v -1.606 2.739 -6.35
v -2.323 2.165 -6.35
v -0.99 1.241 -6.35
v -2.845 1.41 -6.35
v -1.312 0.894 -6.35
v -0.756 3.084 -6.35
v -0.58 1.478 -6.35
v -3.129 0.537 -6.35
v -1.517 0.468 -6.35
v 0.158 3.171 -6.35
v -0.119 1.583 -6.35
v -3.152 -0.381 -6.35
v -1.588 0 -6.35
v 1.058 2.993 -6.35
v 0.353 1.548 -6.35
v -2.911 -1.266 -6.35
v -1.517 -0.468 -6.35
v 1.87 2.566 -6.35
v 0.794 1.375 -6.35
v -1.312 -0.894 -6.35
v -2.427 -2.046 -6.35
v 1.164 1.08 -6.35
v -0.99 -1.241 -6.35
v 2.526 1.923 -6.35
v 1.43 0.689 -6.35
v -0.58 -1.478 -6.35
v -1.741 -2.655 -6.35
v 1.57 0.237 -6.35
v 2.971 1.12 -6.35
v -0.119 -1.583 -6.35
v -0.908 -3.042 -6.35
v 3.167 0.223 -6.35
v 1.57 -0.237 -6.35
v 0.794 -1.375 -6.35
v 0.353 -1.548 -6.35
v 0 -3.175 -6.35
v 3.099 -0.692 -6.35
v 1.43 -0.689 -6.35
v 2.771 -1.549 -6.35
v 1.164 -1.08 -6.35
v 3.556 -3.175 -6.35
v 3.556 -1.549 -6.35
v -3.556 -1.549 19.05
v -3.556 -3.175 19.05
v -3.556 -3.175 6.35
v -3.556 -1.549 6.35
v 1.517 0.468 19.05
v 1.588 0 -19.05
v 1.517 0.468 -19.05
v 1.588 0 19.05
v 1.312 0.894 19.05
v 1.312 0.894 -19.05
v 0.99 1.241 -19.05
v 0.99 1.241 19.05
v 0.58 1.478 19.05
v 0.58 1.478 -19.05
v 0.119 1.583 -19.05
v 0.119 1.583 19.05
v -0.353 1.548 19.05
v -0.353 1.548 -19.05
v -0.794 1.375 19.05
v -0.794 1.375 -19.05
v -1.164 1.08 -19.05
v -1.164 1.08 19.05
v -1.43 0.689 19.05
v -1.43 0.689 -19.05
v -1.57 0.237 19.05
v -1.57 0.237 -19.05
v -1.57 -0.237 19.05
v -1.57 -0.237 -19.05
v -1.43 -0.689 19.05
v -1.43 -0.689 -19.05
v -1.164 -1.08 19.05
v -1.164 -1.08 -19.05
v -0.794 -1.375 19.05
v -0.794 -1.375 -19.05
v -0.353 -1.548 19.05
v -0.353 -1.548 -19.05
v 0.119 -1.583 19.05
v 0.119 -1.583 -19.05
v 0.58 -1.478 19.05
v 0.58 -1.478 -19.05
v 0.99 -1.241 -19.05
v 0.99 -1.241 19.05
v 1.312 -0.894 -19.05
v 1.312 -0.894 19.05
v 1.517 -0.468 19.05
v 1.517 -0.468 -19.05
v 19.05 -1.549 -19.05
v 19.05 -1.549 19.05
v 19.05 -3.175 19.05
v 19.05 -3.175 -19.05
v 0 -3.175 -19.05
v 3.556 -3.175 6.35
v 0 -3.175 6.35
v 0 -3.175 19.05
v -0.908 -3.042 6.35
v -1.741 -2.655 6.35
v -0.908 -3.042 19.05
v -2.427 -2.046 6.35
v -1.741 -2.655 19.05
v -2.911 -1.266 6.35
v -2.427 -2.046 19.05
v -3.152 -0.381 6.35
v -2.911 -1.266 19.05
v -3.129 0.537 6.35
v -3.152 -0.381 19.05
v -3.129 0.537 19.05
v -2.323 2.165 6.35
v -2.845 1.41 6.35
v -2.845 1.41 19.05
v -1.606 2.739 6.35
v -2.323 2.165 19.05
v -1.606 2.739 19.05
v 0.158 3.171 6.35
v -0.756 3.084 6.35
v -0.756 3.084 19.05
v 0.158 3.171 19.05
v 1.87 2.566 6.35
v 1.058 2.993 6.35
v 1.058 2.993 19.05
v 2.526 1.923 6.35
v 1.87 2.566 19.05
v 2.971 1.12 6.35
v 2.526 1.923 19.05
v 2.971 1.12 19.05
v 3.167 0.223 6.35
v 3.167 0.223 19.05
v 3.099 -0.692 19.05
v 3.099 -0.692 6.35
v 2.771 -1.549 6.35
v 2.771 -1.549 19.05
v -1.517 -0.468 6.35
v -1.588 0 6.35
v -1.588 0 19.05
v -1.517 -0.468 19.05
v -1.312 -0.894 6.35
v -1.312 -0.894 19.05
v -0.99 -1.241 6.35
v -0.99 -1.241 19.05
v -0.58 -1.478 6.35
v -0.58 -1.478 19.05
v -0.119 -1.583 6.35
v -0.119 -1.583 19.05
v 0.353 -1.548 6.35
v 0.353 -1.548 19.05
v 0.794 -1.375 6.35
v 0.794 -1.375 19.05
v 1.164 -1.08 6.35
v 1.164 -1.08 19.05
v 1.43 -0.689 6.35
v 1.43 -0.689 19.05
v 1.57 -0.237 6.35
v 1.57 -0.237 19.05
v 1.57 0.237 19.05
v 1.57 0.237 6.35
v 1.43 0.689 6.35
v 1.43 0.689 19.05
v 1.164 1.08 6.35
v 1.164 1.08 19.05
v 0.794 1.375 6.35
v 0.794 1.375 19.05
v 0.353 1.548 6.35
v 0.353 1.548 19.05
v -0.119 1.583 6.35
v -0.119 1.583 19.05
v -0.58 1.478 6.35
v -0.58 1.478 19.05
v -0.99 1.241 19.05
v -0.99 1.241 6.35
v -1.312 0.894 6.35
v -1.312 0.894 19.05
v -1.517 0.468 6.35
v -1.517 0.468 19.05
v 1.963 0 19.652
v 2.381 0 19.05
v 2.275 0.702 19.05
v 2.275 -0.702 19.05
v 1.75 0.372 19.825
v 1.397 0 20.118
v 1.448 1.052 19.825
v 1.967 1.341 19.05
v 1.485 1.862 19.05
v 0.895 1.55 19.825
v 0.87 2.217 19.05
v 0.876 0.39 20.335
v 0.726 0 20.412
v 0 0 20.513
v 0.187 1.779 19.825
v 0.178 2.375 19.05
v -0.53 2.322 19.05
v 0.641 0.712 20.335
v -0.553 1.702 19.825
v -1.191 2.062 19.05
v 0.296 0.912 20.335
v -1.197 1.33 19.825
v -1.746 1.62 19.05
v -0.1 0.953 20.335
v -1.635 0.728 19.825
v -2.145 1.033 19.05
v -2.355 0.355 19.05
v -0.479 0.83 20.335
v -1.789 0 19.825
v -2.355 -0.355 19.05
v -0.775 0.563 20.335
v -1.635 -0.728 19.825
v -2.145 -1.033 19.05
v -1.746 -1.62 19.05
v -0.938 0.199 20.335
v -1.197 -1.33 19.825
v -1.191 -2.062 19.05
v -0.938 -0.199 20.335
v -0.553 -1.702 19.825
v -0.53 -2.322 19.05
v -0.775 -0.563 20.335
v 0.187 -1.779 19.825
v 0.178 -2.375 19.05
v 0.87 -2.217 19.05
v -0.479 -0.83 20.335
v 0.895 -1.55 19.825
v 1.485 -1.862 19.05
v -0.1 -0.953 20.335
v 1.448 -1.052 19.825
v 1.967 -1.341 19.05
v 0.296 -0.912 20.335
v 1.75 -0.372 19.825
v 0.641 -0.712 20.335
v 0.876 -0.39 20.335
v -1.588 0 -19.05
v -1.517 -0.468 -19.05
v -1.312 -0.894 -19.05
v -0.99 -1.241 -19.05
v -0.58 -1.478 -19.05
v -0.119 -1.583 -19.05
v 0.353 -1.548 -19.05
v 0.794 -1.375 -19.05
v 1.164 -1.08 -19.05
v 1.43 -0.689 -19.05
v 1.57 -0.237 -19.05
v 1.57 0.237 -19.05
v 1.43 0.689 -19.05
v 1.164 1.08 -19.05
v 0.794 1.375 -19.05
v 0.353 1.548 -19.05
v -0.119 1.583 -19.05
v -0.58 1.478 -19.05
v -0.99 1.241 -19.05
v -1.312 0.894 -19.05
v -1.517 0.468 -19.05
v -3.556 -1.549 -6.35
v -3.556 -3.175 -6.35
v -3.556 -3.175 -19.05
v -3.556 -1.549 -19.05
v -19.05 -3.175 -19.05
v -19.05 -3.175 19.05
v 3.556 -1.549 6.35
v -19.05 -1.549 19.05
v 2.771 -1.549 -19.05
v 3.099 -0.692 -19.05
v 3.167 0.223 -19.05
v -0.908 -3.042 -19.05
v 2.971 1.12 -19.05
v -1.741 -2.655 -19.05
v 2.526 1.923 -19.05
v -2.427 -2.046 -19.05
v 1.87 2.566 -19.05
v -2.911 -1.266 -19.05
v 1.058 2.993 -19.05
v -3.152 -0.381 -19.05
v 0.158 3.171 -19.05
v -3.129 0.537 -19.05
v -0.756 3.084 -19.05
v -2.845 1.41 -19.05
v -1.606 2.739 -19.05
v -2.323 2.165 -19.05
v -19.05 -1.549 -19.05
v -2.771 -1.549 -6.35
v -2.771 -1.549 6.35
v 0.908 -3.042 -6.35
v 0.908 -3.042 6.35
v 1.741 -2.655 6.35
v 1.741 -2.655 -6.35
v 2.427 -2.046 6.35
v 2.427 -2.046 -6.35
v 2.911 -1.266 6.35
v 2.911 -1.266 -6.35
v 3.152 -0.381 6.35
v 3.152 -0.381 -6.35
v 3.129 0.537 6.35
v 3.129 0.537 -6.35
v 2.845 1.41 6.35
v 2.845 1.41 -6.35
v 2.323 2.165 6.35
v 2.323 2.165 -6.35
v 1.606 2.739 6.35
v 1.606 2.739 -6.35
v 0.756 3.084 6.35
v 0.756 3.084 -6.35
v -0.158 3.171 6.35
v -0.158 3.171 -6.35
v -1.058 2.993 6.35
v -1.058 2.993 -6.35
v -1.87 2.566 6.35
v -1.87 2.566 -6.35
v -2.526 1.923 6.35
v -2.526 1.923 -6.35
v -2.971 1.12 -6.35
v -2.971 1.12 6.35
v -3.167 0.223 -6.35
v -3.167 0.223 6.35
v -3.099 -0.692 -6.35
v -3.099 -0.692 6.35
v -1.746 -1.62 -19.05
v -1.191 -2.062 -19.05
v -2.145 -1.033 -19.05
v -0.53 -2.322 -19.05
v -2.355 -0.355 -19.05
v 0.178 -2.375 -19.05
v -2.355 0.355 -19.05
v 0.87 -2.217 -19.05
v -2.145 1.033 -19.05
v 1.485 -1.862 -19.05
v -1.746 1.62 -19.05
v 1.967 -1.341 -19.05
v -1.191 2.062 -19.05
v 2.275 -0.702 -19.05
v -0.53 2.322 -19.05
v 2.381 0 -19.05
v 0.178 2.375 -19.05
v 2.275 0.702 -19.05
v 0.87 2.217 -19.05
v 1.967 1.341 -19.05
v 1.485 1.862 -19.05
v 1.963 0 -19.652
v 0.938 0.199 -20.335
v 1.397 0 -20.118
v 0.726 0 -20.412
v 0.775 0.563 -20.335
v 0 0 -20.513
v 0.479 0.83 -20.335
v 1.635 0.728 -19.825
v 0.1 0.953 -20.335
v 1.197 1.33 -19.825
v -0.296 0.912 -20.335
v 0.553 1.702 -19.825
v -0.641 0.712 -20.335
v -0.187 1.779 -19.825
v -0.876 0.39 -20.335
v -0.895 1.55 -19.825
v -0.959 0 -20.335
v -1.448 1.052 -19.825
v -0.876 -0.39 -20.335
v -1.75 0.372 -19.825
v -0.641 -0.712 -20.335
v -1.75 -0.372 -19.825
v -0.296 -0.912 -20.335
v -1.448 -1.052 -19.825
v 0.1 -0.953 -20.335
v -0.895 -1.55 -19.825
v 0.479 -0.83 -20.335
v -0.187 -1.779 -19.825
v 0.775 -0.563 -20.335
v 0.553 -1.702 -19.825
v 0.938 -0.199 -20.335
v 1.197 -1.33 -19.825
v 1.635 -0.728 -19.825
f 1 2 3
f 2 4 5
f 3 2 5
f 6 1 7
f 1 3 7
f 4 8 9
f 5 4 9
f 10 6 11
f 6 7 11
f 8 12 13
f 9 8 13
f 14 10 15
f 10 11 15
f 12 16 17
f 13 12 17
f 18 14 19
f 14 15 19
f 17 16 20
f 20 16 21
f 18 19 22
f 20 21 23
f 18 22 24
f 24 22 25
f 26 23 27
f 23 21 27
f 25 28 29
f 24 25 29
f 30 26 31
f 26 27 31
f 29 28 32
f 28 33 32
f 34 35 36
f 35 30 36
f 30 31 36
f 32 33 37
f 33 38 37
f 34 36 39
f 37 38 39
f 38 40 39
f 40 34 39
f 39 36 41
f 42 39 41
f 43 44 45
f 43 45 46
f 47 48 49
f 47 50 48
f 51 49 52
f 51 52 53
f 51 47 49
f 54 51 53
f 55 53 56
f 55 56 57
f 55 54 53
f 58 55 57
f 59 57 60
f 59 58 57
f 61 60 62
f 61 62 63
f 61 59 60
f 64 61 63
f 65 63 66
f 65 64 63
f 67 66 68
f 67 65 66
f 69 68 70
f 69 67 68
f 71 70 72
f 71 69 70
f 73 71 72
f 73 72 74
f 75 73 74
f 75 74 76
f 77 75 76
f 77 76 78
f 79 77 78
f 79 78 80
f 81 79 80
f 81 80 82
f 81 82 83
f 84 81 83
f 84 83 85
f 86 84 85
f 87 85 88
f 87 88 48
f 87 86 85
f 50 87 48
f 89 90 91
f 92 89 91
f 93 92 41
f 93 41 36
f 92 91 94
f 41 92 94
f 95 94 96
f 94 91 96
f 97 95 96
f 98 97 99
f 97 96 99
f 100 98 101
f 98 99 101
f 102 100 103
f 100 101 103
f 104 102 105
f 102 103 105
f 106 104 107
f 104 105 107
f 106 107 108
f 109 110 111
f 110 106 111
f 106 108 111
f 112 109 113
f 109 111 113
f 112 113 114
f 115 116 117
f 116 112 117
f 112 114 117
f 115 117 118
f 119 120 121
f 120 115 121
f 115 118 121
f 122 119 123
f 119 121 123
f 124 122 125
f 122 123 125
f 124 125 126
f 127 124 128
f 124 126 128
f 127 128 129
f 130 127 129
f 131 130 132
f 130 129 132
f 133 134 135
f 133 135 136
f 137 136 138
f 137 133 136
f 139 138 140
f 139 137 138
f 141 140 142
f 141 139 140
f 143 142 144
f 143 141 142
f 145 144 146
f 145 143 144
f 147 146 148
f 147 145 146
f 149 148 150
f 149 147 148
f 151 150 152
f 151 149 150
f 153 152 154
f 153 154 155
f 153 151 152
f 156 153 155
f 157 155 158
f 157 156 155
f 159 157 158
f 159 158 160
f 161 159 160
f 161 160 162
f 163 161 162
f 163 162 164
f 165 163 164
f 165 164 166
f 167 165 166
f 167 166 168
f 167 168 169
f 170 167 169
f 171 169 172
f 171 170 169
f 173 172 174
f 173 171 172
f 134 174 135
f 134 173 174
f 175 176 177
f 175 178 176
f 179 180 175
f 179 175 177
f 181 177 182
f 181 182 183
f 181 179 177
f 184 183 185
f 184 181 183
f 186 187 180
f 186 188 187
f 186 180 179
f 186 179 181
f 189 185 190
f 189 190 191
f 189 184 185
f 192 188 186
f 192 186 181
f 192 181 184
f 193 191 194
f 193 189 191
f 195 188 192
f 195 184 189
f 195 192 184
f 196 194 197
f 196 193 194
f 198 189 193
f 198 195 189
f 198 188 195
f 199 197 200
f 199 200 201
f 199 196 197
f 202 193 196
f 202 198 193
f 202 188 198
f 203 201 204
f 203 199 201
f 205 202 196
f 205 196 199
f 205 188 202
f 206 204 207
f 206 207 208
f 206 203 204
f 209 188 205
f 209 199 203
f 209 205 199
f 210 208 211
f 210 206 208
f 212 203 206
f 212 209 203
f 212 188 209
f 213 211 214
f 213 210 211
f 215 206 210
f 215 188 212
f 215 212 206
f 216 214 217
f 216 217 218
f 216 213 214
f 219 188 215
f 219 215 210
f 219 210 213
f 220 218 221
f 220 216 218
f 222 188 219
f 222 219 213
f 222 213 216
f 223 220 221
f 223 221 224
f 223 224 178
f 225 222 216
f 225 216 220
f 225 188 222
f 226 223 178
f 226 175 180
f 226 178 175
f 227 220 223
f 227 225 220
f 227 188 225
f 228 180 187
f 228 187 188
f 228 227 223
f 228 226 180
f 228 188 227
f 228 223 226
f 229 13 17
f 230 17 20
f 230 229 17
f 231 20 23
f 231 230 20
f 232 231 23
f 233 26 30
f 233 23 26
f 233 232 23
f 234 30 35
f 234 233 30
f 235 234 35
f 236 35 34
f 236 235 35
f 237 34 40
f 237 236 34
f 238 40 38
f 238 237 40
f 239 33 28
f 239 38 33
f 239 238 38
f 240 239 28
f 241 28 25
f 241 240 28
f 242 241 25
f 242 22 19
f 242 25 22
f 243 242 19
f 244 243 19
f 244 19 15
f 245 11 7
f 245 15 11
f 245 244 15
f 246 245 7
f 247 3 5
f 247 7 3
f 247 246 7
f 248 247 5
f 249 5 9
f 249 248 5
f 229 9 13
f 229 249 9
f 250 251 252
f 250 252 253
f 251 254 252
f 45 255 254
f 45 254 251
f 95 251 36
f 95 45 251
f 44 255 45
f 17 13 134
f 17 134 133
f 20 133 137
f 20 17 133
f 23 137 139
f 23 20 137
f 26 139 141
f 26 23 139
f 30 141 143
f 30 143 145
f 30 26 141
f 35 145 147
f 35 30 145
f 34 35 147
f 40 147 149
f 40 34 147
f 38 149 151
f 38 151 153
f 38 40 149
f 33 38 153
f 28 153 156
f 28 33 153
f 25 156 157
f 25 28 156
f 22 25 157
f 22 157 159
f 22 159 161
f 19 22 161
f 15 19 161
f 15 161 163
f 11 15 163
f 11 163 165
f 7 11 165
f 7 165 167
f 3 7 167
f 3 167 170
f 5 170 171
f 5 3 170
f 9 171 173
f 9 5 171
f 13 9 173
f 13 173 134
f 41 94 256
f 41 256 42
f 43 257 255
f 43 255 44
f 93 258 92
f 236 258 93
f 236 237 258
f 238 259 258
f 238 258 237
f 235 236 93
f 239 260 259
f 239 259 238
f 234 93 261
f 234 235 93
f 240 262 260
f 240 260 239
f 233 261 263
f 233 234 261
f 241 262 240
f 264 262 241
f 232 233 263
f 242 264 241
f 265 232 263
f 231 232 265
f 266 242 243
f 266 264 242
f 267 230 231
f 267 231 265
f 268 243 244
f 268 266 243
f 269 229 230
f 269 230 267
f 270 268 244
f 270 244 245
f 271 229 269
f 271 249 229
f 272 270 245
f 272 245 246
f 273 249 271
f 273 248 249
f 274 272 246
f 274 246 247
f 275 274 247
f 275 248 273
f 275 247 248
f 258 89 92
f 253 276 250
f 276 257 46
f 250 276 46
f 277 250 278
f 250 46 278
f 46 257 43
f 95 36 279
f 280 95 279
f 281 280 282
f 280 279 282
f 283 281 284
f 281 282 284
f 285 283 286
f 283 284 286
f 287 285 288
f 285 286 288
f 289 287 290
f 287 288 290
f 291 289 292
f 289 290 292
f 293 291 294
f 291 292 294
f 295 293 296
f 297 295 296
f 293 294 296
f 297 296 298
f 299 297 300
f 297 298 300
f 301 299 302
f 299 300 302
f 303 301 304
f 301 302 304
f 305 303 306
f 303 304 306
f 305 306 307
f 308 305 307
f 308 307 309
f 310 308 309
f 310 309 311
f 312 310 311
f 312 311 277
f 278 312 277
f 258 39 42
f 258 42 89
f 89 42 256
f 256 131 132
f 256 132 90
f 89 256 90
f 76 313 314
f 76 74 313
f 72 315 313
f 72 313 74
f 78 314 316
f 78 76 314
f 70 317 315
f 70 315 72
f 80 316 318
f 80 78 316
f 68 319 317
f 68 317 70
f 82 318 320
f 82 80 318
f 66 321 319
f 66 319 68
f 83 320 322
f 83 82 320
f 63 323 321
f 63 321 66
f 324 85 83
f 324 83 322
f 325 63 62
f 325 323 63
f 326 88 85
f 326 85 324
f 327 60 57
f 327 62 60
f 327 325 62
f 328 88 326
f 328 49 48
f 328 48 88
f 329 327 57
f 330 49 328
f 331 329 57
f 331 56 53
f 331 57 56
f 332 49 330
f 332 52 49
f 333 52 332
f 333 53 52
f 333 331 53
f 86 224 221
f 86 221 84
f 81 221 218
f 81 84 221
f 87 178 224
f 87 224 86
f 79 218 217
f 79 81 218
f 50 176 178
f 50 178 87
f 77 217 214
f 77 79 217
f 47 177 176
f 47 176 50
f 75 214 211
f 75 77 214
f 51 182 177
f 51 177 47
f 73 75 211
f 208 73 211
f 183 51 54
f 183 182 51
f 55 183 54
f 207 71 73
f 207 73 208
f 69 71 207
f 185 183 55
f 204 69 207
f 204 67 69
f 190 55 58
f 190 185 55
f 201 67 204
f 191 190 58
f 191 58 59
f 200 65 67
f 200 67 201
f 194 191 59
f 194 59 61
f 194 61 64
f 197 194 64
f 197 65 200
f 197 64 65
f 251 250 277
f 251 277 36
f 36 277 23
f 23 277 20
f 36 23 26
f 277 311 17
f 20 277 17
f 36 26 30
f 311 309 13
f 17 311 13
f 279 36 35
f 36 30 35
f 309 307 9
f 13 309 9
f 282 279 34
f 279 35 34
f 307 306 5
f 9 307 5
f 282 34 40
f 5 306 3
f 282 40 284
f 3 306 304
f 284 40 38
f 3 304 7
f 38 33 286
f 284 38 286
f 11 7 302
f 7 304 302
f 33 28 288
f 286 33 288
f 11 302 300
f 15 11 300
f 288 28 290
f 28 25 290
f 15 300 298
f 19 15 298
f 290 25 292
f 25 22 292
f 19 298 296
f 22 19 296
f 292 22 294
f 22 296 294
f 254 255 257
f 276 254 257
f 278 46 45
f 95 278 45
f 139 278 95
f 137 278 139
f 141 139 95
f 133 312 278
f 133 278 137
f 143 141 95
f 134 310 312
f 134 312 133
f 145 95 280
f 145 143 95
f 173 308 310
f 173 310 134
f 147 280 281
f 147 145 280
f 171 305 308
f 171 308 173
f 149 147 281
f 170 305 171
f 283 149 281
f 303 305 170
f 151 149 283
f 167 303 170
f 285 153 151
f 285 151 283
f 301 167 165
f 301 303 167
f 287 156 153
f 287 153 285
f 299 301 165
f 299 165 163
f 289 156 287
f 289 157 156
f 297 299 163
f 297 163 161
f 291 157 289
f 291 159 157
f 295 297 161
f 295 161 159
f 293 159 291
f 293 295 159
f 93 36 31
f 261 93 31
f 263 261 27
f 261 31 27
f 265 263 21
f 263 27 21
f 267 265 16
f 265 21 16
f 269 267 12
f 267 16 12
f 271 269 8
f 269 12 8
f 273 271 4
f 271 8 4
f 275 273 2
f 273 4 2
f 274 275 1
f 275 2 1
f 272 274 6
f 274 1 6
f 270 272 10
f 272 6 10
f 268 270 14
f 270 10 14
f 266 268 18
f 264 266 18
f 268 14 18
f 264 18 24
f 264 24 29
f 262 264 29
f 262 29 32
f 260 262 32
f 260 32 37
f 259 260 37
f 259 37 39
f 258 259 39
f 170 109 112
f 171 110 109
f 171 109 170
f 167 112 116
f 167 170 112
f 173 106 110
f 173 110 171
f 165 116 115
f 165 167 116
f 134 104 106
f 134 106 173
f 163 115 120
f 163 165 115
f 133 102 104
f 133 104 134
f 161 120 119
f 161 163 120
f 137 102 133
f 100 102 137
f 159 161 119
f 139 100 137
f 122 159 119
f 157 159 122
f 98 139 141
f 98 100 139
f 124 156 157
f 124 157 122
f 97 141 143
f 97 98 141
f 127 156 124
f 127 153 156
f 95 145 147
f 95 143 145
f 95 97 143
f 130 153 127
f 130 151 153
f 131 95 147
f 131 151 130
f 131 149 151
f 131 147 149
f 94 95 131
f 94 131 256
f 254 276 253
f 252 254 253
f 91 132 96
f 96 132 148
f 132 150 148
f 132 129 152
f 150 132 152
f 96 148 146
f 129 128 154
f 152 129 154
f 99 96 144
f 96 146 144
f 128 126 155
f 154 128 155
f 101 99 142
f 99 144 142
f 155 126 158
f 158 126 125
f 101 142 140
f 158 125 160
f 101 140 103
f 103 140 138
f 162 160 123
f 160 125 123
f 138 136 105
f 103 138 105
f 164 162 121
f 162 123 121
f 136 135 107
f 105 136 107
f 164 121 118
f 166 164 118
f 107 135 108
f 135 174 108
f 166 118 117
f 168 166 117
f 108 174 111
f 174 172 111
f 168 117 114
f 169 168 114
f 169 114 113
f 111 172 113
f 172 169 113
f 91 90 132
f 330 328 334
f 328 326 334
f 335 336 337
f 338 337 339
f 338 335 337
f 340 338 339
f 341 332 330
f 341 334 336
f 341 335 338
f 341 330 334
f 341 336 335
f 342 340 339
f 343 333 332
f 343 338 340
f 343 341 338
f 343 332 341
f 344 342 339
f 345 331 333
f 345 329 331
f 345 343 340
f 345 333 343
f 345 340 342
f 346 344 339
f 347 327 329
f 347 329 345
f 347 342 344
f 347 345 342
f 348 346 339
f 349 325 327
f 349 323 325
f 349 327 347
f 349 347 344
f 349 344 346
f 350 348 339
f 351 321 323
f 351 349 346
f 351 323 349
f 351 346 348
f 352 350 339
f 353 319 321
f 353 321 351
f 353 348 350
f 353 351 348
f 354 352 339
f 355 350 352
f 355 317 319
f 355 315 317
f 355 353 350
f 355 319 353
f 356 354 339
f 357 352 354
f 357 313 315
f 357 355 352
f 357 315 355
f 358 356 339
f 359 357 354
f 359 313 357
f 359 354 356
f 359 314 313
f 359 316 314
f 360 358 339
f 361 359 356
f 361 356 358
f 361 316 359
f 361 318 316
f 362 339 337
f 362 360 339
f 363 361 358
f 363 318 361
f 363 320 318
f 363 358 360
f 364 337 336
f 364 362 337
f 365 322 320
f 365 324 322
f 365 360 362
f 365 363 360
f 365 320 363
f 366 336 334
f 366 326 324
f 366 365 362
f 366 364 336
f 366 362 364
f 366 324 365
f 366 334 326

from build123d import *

# Parameters (mm, degrees)
SKETCH1_R           = 1.5875
EXTRUDE1_DEPTH      = 19.05
SKETCH1_W           = 15.494
SKETCH1_H           = 1.6256
EXTRUDE1_2_DEPTH    = 19.05
EXTRUDE4_DEPTH      = 29.173887468
EXTRUDE4_DEPTH_BACK = 29.173887468
SKETCH8_W           = 7.112
SKETCH8_H           = 12.7
SKETCH9_R           = 1.5875
EXTRUDE5_DEPTH      = 12.7


with BuildPart() as part:
    # Sketch1 → Extrude1 (new, symmetric)
    with BuildSketch(Plane.XY):
        with BuildLine():
            Line((19.05, -3.175), (0, -3.175))
            ThreePointArc((0, -3.175), (-1.606437051, 2.738610049), (2.771278521, -1.5494))
            Line((2.771278521, -1.5494), (19.05, -1.5494))
            Line((19.05, -1.5494), (19.05, -3.175))
        make_face()
        with Locations(Location((0, 0, 0), (0, 0, 180))):
            Circle(SKETCH1_R, mode=Mode.SUBTRACT)
    extrude(amount=EXTRUDE1_DEPTH, both=True)

    # Sketch8 → Extrude4 (cut, two sides: drawn at the far end of the back side and taken through both)
    with BuildSketch(Plane(origin=(0, 0, 0), x_dir=(1, 0, 0), z_dir=(0, 1, 0)).offset(-EXTRUDE4_DEPTH_BACK)):
        Rectangle(SKETCH8_W, SKETCH8_H)
    extrude(amount=EXTRUDE4_DEPTH + EXTRUDE4_DEPTH_BACK, mode=Mode.SUBTRACT)


with BuildPart() as body_2:
    # Sketch1 → Extrude1 2 (new, symmetric)
    with BuildSketch(Plane.XY):
        with Locations((-11.303, -2.3622)):
            Rectangle(SKETCH1_W, SKETCH1_H)
    extrude(amount=EXTRUDE1_2_DEPTH, both=True)

    # Sketch9 → Extrude5 (add)
    with BuildSketch(Plane.XY.offset(-6.35)):
        with BuildLine():
            Line((-2.771278521, -1.5494), (-3.556, -1.5494))
            Line((-3.556, -1.5494), (-3.556, -3.175))
            Line((-3.556, -3.175), (0, -3.175))
            ThreePointArc((0, -3.175), (1.606437051, 2.738610049), (-2.771278521, -1.5494))
        make_face()
        with Locations(Location((0, 0, 0), (0, 0, 180))):
            Circle(SKETCH9_R, mode=Mode.SUBTRACT)
    extrude(amount=EXTRUDE5_DEPTH)


with BuildPart() as body_3:
    # Sketch6 → Revolve1 (revolve)
    with BuildSketch(Plane(origin=(0, 0, 0), x_dir=(1, 0, 0), z_dir=(0, 1, 0)), mode=Mode.PRIVATE) as revolve1_sk:
        with BuildLine():
            Line((-2.38125, 19.05), (-1.5875, 19.05))
            Line((-1.5875, 19.05), (-1.5875, -19.05))
            Line((-1.5875, -19.05), (-2.38125, -19.05))
            ThreePointArc((-2.38125, -19.05), (-1.397393789, -20.118057742), (0, -20.51304))
            Line((0, -20.51304), (0, 20.51304))
            ThreePointArc((0, 20.51304), (-1.397393789, 20.118057742), (-2.38125, 19.05))
        make_face()
    revolve(revolve1_sk.sketch.rotate(Axis((0, 0, -20.51304), (0, 0, 1)), 180), axis=Axis((0, 0, -20.51304), (0, 0, 1)))


solid = Compound([part.part, body_2.part, body_3.part])
